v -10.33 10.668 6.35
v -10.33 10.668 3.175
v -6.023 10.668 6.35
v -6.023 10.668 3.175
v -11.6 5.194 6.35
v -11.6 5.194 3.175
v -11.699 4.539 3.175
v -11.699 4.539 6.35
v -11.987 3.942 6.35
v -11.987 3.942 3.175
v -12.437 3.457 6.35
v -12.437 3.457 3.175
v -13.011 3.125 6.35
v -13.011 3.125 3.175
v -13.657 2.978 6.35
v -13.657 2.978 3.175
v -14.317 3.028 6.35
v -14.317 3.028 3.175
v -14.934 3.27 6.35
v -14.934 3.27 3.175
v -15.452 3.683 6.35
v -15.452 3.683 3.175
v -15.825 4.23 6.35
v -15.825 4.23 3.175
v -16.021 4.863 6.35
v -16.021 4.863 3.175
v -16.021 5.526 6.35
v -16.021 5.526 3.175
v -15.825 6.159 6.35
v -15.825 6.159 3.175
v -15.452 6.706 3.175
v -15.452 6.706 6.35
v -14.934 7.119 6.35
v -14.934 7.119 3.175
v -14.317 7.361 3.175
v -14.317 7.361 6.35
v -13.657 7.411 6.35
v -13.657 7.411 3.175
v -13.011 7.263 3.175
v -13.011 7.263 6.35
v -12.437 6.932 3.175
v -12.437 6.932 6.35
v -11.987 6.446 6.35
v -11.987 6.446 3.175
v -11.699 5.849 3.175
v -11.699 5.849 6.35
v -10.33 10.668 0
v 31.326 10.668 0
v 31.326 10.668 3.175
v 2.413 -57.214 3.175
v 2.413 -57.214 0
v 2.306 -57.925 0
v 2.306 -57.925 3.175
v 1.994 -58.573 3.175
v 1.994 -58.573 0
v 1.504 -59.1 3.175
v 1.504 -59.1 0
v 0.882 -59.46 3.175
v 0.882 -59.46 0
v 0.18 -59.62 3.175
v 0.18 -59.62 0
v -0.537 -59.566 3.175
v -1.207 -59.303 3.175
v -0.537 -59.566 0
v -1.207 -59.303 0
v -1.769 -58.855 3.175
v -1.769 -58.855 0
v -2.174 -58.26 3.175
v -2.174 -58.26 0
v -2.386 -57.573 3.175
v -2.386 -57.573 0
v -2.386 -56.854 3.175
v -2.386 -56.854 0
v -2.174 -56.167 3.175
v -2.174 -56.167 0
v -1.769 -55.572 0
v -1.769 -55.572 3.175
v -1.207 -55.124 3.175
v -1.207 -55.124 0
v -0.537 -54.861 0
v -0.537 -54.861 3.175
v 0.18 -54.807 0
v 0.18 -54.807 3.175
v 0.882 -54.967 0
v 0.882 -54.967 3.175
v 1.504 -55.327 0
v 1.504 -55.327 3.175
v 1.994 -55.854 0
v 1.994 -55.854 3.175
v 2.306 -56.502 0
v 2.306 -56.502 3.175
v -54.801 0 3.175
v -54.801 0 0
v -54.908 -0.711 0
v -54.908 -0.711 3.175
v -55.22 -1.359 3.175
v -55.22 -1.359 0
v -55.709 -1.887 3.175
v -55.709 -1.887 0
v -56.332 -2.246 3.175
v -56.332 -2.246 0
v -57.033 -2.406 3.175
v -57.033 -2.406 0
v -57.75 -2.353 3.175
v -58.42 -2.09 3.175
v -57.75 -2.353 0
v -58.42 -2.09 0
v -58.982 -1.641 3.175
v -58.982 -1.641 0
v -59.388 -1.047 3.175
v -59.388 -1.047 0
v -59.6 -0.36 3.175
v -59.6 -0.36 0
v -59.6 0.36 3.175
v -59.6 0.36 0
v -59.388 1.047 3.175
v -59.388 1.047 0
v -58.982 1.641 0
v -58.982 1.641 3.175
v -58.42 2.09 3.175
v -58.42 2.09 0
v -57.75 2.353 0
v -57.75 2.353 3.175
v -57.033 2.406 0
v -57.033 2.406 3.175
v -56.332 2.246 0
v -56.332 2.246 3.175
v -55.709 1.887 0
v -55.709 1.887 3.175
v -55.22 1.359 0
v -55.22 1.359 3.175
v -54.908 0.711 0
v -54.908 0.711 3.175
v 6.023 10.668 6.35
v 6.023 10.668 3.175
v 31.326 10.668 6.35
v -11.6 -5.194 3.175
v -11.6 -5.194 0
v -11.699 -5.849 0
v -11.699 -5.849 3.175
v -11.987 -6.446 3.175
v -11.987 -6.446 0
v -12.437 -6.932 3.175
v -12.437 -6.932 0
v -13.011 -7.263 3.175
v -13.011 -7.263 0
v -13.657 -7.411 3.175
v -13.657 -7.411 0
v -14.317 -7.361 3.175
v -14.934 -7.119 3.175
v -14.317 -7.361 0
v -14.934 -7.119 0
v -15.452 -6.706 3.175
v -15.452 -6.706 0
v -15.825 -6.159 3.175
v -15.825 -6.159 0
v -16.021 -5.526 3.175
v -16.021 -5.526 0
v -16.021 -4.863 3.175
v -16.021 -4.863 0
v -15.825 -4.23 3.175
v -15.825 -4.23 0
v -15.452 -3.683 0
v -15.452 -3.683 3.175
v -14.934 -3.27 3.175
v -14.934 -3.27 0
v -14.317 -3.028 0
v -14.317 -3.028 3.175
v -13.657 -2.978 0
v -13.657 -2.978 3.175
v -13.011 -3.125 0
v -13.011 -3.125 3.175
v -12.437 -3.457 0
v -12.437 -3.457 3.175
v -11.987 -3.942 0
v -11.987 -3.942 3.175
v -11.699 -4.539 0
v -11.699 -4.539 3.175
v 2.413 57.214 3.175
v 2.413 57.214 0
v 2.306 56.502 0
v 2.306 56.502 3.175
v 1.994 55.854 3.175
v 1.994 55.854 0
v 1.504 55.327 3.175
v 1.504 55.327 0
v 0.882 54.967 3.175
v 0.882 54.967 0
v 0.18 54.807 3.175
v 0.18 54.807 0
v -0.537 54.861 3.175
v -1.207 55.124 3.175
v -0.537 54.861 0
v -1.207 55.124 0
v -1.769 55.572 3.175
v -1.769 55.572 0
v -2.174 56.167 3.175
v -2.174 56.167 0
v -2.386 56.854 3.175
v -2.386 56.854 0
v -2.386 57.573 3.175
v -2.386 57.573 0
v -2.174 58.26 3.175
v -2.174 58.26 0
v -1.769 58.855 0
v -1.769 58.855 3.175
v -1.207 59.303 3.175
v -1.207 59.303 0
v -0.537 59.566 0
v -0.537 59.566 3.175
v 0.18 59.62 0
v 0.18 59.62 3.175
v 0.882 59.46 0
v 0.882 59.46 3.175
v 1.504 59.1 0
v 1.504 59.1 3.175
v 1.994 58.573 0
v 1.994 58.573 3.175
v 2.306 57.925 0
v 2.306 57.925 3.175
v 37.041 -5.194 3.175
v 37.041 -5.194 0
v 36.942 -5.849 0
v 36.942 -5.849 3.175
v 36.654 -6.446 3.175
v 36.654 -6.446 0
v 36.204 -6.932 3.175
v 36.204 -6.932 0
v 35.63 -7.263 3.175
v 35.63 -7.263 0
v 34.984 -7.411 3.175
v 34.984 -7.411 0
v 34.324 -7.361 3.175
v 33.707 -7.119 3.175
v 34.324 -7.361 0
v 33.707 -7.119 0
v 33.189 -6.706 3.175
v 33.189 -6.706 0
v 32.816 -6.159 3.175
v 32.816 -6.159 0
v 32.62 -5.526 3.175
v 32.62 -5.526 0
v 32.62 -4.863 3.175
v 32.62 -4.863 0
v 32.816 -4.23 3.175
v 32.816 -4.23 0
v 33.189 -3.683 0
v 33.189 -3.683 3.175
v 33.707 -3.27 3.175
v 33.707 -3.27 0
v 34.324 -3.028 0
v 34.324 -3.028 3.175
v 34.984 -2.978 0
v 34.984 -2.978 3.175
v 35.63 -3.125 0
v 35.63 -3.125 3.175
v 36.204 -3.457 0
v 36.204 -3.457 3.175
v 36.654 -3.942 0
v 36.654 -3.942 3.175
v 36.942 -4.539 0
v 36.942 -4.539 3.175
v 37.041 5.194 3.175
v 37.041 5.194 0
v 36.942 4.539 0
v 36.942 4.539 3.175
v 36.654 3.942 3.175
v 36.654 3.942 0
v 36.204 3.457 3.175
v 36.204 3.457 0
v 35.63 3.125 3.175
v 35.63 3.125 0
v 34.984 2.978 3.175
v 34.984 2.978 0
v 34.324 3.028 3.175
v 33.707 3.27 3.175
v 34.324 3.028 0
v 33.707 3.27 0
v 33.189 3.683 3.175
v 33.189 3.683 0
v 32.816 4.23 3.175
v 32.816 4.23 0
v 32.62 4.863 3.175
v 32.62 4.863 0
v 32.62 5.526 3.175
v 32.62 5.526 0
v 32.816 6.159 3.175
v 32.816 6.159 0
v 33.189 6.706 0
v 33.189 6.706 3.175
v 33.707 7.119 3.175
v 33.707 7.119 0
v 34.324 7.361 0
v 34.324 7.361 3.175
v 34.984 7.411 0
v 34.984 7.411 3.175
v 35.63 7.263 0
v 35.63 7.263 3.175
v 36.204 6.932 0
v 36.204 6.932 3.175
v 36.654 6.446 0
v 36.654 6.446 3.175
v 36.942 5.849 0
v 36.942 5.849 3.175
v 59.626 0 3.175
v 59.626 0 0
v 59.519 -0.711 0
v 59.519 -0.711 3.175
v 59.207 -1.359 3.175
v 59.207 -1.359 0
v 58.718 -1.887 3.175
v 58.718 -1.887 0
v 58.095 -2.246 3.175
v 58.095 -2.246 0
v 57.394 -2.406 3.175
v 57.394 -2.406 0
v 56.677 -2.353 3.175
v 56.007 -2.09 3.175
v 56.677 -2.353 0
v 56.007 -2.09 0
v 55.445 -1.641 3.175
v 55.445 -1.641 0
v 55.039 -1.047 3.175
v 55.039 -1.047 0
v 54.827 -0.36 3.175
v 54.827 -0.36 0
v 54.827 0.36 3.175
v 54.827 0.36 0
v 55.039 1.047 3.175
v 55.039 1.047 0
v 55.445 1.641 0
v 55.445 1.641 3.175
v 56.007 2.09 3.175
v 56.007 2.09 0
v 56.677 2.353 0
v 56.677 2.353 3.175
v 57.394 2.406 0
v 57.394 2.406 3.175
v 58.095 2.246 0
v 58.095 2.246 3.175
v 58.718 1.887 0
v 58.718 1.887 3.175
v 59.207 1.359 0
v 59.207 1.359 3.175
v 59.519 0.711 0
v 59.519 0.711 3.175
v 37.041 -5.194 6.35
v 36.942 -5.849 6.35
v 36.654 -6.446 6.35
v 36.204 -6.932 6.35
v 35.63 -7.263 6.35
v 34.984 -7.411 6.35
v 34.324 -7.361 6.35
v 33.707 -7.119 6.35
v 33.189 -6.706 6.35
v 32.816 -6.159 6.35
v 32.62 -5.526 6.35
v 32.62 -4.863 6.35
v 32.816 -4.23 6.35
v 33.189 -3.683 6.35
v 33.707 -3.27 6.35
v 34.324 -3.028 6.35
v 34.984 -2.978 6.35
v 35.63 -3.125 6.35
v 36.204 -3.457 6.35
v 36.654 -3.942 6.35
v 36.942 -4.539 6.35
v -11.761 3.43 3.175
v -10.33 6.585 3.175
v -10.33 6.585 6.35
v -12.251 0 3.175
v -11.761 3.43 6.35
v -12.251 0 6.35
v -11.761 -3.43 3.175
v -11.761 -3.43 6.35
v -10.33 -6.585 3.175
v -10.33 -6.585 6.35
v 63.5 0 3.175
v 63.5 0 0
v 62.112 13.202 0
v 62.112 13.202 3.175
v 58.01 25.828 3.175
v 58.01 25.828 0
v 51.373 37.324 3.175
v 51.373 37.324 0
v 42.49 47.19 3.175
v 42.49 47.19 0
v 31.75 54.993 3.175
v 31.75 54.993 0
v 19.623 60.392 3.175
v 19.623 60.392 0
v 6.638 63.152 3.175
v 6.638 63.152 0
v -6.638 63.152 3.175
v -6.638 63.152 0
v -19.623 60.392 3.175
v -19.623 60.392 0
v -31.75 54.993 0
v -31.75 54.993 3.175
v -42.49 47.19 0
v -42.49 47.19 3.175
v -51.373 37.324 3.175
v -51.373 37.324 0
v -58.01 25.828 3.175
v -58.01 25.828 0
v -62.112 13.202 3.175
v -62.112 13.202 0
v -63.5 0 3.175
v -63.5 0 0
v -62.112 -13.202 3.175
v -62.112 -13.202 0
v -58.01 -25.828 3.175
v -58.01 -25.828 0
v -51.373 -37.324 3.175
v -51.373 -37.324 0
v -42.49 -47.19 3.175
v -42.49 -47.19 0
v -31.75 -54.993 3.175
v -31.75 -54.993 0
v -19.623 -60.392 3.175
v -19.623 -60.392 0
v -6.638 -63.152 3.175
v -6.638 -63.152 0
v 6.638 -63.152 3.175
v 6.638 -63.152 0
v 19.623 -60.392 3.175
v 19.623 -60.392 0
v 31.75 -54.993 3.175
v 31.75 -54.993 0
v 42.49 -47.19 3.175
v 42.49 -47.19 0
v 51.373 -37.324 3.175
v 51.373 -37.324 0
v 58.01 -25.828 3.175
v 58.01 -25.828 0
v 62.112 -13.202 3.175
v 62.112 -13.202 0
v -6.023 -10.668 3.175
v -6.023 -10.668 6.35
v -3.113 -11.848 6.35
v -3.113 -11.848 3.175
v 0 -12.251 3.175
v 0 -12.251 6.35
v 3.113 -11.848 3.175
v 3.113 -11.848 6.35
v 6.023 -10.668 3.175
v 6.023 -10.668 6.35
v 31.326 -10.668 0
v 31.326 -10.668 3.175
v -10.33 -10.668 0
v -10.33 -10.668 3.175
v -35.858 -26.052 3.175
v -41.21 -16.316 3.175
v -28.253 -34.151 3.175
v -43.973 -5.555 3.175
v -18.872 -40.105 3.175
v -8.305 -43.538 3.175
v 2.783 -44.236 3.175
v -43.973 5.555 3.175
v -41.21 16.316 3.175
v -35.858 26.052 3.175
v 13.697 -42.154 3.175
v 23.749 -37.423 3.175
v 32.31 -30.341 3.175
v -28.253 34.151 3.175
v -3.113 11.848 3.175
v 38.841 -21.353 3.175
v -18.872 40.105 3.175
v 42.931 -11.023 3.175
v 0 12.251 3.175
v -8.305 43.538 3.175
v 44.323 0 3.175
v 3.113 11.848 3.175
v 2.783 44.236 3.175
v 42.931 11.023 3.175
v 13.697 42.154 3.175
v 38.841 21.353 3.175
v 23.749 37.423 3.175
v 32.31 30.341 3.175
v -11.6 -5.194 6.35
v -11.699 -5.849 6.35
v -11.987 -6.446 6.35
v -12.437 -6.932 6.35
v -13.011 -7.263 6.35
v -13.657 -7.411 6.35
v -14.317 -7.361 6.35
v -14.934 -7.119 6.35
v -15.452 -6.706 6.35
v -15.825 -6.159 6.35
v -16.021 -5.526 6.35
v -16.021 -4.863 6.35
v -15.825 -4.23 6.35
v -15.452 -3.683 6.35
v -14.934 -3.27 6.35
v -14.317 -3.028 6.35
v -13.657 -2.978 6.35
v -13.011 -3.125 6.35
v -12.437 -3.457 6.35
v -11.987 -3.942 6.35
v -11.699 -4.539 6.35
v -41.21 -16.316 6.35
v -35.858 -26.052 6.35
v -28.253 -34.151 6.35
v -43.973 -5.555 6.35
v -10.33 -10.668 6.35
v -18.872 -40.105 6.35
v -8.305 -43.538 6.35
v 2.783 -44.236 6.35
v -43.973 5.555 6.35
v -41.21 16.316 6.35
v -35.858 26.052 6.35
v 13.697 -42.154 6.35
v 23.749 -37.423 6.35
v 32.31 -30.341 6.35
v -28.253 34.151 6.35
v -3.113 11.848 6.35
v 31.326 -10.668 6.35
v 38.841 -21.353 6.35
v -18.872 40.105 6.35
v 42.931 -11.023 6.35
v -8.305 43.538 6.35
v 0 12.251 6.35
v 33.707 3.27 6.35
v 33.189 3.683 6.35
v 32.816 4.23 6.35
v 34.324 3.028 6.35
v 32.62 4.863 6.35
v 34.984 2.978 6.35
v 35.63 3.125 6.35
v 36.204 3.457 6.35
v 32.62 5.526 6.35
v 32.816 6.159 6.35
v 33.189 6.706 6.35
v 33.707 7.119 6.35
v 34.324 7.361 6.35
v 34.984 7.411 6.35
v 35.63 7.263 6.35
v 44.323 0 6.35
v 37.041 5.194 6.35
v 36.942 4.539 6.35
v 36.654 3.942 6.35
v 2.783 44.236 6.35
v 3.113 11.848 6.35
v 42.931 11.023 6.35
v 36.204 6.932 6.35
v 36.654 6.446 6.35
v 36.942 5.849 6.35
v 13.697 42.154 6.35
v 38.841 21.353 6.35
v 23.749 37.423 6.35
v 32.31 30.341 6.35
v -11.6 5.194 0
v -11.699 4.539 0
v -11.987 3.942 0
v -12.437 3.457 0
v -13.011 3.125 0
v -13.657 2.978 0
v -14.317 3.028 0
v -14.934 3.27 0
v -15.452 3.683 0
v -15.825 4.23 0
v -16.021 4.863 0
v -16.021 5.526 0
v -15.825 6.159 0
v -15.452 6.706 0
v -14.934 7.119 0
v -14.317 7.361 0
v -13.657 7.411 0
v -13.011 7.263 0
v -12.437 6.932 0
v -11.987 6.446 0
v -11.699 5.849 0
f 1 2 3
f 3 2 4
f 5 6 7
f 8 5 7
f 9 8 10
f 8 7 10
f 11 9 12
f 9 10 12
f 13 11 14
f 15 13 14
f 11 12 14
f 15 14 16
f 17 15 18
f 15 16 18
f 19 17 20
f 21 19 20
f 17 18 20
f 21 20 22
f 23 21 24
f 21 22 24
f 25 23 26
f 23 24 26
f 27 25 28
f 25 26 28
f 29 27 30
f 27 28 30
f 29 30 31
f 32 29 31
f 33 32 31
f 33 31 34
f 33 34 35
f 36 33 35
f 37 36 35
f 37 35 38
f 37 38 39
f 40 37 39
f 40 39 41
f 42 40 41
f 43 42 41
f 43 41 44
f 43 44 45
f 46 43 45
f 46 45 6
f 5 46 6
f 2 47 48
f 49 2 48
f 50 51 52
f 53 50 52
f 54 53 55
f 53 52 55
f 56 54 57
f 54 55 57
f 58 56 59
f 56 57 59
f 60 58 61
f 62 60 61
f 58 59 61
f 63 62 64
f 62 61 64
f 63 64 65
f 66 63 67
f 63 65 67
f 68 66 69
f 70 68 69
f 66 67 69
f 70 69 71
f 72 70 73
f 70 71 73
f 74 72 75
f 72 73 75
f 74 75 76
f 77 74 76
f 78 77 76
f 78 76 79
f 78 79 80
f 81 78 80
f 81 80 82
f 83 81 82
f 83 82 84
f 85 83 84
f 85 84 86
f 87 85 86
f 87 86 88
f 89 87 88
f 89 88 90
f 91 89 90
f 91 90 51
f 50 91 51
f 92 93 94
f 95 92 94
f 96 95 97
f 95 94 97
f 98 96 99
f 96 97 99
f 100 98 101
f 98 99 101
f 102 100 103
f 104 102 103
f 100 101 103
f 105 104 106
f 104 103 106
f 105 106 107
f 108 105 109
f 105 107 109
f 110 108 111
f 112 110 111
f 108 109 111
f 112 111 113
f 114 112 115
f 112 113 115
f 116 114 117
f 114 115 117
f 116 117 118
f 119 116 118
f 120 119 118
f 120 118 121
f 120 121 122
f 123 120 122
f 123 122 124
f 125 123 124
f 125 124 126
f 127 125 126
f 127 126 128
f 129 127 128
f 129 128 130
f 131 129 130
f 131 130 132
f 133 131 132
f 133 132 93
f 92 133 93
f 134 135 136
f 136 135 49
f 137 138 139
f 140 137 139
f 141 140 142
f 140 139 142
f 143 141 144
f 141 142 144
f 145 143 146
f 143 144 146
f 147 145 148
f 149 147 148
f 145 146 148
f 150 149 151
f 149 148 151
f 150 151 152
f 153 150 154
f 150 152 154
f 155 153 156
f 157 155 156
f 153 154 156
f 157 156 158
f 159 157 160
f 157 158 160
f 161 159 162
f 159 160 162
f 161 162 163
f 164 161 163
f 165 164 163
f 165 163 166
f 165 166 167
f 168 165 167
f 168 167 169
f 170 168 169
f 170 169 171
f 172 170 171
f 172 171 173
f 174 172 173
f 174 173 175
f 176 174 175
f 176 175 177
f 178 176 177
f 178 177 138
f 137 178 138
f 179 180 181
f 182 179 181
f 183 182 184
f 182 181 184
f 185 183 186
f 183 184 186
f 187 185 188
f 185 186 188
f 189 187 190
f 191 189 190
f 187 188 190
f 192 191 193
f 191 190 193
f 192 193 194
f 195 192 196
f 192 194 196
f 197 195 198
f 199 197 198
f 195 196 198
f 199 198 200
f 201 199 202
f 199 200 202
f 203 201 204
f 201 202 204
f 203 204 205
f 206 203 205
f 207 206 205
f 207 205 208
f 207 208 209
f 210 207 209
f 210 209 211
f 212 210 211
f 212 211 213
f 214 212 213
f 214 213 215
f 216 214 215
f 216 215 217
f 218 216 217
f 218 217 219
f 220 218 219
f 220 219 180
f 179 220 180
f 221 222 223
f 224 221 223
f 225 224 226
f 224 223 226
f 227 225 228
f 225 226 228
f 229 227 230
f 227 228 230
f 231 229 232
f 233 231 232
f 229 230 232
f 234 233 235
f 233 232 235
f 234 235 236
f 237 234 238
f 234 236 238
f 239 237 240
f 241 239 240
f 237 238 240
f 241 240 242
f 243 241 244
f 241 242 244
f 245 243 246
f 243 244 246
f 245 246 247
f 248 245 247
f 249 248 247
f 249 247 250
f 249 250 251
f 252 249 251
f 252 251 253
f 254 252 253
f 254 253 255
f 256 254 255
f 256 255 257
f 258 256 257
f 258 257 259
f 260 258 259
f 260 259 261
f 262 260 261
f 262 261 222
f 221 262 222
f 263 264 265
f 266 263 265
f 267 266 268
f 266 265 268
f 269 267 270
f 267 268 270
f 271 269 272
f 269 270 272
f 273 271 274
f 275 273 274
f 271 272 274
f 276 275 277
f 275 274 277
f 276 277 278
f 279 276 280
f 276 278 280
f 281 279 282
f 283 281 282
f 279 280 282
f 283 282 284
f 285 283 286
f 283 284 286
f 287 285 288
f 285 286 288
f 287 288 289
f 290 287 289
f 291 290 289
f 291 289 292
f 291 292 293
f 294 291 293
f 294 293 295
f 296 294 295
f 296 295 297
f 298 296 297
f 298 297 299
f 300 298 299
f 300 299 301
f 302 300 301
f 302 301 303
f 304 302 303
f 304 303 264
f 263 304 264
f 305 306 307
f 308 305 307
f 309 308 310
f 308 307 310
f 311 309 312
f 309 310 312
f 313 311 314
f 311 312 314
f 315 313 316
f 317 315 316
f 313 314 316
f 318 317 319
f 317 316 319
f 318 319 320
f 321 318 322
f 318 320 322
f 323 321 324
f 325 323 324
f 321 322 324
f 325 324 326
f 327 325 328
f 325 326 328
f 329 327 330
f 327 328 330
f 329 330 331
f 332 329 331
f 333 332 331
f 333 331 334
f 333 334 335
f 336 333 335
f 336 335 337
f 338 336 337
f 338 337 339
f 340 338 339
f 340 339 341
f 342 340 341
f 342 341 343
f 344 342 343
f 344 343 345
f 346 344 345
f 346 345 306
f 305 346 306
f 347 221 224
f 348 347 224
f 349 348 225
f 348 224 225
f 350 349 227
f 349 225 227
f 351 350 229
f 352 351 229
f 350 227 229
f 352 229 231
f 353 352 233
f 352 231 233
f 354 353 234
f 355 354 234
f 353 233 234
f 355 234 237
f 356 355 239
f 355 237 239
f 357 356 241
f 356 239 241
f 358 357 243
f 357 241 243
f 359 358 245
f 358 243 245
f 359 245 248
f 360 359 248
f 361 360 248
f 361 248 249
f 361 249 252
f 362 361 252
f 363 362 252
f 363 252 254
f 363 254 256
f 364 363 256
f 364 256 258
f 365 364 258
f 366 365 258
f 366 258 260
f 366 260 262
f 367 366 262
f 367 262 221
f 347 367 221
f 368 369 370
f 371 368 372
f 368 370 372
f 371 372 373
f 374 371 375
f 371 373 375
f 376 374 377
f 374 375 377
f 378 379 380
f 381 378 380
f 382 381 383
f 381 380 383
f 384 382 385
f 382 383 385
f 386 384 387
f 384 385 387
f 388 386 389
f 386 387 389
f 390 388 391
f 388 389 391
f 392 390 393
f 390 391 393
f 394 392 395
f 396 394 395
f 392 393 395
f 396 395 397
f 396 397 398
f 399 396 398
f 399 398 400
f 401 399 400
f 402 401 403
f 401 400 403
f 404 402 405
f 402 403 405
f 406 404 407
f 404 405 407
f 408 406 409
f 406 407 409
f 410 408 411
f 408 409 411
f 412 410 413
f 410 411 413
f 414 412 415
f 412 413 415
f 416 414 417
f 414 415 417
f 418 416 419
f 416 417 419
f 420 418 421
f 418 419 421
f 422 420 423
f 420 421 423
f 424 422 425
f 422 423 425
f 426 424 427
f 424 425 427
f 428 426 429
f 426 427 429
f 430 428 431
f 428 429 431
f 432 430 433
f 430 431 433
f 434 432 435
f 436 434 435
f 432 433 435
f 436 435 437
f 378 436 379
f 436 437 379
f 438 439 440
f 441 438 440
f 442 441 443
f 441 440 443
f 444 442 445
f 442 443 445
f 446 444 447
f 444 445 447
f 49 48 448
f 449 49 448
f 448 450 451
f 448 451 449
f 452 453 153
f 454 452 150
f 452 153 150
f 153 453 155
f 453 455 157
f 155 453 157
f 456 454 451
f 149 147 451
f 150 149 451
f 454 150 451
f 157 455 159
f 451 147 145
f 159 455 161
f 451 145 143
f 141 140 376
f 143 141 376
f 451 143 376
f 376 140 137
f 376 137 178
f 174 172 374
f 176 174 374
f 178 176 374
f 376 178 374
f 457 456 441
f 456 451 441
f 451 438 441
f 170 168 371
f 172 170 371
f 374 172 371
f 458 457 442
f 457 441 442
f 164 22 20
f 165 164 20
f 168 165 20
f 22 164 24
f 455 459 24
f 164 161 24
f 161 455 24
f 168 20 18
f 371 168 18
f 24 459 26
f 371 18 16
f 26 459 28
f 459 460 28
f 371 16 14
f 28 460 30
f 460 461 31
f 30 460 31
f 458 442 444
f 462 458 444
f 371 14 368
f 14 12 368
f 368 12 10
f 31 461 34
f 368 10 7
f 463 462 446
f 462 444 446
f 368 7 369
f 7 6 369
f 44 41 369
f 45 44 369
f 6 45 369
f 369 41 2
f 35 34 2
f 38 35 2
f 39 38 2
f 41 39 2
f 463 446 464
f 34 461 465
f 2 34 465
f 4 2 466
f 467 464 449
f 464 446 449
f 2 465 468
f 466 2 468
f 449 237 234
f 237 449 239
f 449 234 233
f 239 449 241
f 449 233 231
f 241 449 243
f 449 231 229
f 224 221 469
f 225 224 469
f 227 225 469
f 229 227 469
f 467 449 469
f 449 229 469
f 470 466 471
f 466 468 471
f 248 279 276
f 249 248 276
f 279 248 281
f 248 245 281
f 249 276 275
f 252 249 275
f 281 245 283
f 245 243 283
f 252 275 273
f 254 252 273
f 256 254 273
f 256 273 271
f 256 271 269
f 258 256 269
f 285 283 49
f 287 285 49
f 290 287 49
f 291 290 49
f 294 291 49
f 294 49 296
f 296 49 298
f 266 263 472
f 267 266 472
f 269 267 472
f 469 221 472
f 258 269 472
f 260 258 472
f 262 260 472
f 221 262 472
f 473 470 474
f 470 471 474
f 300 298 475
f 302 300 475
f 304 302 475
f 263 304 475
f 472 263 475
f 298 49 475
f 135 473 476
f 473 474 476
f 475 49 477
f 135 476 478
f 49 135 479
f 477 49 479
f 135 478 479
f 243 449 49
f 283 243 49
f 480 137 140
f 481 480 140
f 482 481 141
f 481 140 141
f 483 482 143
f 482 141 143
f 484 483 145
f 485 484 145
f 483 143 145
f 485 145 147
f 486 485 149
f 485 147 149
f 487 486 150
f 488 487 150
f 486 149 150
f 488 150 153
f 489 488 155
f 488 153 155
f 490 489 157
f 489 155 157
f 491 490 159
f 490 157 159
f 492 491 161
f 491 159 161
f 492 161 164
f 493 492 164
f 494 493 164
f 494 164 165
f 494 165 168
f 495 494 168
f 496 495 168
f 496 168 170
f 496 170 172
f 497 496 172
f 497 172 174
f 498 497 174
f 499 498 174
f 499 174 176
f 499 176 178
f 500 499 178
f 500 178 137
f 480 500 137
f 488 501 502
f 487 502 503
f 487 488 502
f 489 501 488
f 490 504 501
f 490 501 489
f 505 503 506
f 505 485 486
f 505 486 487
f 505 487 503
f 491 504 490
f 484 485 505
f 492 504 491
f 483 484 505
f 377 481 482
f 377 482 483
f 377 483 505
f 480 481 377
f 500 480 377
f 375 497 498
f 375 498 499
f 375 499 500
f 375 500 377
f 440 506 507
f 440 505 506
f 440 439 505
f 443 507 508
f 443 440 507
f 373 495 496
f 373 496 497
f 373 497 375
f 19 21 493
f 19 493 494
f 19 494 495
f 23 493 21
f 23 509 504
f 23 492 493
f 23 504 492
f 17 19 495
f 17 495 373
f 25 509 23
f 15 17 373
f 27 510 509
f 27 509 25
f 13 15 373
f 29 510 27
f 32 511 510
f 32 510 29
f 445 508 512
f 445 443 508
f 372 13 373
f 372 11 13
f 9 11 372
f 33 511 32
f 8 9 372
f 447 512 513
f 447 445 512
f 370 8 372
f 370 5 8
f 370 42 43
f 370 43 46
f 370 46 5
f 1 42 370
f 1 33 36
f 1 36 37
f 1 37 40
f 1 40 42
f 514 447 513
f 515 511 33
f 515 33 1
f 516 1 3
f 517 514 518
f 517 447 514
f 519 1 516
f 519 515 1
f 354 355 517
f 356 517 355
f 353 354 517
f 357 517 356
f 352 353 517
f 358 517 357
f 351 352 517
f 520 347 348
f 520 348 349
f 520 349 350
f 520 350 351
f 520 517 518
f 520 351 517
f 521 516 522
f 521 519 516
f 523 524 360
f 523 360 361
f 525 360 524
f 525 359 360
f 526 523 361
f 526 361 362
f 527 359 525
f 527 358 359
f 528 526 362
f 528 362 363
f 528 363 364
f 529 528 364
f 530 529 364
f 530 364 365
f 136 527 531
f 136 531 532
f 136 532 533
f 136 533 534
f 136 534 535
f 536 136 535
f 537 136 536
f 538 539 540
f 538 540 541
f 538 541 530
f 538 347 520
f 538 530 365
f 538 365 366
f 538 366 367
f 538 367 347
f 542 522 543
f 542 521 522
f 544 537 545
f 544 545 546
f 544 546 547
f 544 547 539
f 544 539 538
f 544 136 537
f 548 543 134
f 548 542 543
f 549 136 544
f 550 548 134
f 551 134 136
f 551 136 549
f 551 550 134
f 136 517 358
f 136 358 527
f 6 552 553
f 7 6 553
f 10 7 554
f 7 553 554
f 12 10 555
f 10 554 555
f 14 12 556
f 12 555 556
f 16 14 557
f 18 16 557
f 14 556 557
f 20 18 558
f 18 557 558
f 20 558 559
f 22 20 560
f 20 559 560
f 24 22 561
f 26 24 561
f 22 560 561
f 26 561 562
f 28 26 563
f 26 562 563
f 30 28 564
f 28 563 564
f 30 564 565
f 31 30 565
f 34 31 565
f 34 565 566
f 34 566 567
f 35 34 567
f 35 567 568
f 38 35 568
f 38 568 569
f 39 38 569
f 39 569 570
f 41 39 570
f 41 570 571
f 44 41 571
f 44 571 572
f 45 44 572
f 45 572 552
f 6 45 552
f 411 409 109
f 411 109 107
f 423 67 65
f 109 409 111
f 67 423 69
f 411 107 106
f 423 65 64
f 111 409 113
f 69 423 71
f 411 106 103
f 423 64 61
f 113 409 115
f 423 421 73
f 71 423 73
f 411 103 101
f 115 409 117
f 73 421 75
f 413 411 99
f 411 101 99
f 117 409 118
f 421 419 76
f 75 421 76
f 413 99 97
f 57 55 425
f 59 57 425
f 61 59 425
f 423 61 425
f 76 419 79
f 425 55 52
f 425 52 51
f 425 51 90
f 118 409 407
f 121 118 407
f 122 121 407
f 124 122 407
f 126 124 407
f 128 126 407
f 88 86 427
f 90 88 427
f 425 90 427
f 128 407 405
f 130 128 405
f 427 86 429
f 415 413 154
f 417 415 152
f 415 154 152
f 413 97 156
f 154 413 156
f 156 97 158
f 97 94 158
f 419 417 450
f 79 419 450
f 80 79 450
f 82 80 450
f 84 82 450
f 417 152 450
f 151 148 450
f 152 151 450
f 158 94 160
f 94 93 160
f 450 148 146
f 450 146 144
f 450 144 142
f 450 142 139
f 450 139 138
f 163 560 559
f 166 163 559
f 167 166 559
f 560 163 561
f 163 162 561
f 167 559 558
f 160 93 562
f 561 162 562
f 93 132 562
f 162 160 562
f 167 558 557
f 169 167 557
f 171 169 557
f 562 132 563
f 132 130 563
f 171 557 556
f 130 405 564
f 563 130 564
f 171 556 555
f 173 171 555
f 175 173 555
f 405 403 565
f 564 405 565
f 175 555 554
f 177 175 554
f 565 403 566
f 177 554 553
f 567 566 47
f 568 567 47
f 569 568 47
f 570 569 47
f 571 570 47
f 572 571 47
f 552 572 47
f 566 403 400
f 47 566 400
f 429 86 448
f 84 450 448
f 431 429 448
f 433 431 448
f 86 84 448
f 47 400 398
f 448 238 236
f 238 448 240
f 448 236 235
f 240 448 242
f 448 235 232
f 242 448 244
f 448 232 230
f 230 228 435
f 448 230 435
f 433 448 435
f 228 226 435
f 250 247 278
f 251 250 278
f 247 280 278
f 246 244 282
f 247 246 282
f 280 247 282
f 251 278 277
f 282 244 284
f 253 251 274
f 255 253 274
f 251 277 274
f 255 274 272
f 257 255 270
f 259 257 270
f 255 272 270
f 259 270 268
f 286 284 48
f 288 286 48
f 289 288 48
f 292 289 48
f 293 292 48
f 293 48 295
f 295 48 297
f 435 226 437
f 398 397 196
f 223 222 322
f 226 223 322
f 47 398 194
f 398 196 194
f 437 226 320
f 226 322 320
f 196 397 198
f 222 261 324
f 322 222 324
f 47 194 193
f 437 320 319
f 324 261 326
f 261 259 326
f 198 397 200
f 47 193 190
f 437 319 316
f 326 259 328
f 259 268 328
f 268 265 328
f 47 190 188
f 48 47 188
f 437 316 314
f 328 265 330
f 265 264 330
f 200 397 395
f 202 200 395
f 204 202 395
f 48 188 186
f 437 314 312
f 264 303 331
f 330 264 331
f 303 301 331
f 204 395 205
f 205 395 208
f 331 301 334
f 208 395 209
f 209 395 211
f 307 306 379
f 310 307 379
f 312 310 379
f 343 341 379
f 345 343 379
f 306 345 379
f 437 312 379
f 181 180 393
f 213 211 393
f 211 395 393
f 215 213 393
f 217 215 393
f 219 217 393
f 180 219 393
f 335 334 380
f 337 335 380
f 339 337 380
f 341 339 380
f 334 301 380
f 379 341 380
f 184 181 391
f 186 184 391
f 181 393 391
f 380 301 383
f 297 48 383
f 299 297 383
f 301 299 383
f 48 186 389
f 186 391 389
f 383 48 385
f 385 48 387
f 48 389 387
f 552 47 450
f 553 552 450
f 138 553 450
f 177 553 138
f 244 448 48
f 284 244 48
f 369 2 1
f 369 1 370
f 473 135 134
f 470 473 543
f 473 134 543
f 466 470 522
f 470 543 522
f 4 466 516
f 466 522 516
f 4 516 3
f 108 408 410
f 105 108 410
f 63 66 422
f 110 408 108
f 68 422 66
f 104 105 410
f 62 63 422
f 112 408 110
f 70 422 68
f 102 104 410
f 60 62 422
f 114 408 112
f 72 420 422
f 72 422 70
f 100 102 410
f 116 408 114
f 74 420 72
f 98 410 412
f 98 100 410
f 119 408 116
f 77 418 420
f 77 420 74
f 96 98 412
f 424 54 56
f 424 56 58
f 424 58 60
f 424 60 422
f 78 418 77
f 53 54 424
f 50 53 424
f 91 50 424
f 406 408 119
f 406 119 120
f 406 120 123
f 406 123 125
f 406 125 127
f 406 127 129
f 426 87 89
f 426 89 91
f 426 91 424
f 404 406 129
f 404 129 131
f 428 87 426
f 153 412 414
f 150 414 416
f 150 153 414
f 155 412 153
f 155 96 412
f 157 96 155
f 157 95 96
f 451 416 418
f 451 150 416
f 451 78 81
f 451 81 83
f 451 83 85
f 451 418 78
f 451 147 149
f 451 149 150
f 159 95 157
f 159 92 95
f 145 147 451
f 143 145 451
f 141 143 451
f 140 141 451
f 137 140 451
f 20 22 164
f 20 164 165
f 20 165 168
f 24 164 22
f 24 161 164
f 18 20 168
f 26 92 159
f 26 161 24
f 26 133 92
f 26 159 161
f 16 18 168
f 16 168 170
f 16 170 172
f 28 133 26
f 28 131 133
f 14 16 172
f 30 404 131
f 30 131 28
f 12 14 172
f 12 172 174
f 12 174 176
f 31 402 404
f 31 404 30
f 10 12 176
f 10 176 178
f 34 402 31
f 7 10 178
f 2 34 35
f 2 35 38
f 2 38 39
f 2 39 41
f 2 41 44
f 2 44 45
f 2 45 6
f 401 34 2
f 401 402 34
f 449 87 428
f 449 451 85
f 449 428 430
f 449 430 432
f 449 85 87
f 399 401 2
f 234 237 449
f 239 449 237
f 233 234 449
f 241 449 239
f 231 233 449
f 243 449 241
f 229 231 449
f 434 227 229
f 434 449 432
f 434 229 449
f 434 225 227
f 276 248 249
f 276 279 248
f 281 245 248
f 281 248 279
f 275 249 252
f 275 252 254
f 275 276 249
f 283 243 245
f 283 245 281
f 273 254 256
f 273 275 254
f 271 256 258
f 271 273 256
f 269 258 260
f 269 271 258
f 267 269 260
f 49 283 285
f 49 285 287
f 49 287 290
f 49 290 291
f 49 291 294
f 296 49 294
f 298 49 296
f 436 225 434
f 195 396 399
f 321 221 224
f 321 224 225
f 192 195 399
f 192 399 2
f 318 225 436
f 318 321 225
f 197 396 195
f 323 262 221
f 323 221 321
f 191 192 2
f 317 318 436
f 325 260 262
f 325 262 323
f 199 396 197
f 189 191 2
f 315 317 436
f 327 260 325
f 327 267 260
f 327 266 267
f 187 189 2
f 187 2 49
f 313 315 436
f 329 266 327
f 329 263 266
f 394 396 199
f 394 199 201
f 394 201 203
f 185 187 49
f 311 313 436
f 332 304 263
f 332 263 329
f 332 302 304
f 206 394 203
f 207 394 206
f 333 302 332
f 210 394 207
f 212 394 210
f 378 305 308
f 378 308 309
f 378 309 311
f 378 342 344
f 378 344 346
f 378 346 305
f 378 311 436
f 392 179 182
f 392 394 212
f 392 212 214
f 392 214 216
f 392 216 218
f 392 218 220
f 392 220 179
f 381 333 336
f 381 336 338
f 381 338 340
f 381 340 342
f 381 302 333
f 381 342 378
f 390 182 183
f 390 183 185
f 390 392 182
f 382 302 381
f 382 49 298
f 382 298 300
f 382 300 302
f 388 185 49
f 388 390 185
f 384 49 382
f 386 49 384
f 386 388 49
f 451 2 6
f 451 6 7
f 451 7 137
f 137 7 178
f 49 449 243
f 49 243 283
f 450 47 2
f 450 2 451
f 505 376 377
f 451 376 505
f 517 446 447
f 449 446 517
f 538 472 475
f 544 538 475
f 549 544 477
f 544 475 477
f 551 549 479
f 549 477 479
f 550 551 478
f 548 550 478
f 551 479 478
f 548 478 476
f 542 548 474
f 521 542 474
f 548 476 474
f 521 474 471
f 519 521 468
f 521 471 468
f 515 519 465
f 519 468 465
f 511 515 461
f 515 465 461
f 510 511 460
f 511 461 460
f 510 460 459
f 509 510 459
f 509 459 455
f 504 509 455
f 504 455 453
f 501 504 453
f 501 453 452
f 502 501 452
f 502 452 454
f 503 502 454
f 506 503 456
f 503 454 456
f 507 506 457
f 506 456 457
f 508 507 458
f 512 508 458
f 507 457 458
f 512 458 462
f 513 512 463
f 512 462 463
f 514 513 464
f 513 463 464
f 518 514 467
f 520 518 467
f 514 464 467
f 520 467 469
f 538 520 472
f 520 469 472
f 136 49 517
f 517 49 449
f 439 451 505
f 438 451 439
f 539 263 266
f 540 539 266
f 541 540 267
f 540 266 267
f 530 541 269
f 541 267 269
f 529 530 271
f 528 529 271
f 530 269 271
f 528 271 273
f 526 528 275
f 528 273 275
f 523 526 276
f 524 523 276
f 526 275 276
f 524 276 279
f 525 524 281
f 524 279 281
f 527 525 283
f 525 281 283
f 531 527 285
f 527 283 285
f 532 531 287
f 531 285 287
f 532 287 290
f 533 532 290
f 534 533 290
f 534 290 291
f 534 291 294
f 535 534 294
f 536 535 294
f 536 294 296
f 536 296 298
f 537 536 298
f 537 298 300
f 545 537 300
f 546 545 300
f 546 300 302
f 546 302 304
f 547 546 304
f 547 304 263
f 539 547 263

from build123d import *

# Parameters (mm, degrees)
F0_R     = 63.5
F1_DEPTH = 3.175
F2_R     = 63.5
F2_R_2   = 50.927
F3_DEPTH = 3.175
F2_R_3   = 44.323
F4_W     = 41.656
F4_H     = 21.336
F4_R     = 2.2225
F4_R_2   = 2.413
F5_DEPTH = 6.351
F6_DEPTH = 25.4
F7_R     = 12.2505894572
F8_DEPTH = 6.351


with BuildPart() as f1:
    # F0 (on Top) → F1 (new body)
    with BuildSketch(Plane.XY):
        Circle(F0_R)
    extrude(amount=F1_DEPTH)


with BuildPart() as f3:
    # F2 (on face) → F3 (new body)
    with BuildSketch(Plane.XY.offset(3.175)):
        Circle(F2_R)
        Circle(F2_R_2, mode=Mode.SUBTRACT)
    extrude(amount=F3_DEPTH)


with BuildPart() as f3b:
    # F2 (on face) → F3, piece 2 (new body)
    with BuildSketch(Plane.XY.offset(3.175)):
        Circle(F2_R_3)
    extrude(amount=F3_DEPTH)


with BuildPart() as f5_tool:
    # F4 (on face) → F5 (new body, through all)
    with BuildSketch(Plane(origin=(0, 0, 0), x_dir=(1, 0, 0), z_dir=(0, 0, -1))):
        with Locations((10.4976304106, 0)):
            Rectangle(F4_W, F4_H)
        with Locations((34.8181304106, -5.1943)):
            Circle(F4_R)
        with Locations((34.8181304106, 5.1943)):
            Circle(F4_R)
        with Locations((-13.8228695894, 5.1943)):
            Circle(F4_R)
        with Locations((-13.8228695894, -5.1943)):
            Circle(F4_R)
        with Locations((-57.2135, 0)):
            Circle(F4_R_2)
        with Locations((0, -57.2135)):
            Circle(F4_R_2)
        with Locations((57.2135, 0)):
            Circle(F4_R_2)
        with Locations((0, 57.2135)):
            Circle(F4_R_2)
    extrude(amount=-F5_DEPTH)


with BuildPart() as f1_1:
    add(f1.part)

    # F5: cut by f5_tool
    add(f5_tool.part, mode=Mode.SUBTRACT)

    # F4 (on face) → F6 (cut)
    with BuildSketch(Plane(origin=(0, 0, 0), x_dir=(1, 0, 0), z_dir=(0, 0, -1))):
        with Locations((-57.2135, 0)):
            Circle(F4_R_2)
        with Locations((0, 57.2135)):
            Circle(F4_R_2)
        with Locations((57.2135, 0)):
            Circle(F4_R_2)
        with Locations((0, -57.2135)):
            Circle(F4_R_2)
    extrude(amount=-F6_DEPTH, mode=Mode.SUBTRACT)


with BuildPart() as f3_1:
    add(f3.part)

    # F5: cut by f5_tool
    add(f5_tool.part, mode=Mode.SUBTRACT)


with BuildPart() as f3b_1:
    add(f3b.part)

    # F5: cut by f5_tool
    add(f5_tool.part, mode=Mode.SUBTRACT)

    # F7 (on face) → F8 (cut, through all)
    with BuildSketch(Plane.XY.offset(6.35)):
        Circle(F7_R)
    extrude(amount=-F8_DEPTH, mode=Mode.SUBTRACT)


solid = Compound([f1_1.part, f3b_1.part])
